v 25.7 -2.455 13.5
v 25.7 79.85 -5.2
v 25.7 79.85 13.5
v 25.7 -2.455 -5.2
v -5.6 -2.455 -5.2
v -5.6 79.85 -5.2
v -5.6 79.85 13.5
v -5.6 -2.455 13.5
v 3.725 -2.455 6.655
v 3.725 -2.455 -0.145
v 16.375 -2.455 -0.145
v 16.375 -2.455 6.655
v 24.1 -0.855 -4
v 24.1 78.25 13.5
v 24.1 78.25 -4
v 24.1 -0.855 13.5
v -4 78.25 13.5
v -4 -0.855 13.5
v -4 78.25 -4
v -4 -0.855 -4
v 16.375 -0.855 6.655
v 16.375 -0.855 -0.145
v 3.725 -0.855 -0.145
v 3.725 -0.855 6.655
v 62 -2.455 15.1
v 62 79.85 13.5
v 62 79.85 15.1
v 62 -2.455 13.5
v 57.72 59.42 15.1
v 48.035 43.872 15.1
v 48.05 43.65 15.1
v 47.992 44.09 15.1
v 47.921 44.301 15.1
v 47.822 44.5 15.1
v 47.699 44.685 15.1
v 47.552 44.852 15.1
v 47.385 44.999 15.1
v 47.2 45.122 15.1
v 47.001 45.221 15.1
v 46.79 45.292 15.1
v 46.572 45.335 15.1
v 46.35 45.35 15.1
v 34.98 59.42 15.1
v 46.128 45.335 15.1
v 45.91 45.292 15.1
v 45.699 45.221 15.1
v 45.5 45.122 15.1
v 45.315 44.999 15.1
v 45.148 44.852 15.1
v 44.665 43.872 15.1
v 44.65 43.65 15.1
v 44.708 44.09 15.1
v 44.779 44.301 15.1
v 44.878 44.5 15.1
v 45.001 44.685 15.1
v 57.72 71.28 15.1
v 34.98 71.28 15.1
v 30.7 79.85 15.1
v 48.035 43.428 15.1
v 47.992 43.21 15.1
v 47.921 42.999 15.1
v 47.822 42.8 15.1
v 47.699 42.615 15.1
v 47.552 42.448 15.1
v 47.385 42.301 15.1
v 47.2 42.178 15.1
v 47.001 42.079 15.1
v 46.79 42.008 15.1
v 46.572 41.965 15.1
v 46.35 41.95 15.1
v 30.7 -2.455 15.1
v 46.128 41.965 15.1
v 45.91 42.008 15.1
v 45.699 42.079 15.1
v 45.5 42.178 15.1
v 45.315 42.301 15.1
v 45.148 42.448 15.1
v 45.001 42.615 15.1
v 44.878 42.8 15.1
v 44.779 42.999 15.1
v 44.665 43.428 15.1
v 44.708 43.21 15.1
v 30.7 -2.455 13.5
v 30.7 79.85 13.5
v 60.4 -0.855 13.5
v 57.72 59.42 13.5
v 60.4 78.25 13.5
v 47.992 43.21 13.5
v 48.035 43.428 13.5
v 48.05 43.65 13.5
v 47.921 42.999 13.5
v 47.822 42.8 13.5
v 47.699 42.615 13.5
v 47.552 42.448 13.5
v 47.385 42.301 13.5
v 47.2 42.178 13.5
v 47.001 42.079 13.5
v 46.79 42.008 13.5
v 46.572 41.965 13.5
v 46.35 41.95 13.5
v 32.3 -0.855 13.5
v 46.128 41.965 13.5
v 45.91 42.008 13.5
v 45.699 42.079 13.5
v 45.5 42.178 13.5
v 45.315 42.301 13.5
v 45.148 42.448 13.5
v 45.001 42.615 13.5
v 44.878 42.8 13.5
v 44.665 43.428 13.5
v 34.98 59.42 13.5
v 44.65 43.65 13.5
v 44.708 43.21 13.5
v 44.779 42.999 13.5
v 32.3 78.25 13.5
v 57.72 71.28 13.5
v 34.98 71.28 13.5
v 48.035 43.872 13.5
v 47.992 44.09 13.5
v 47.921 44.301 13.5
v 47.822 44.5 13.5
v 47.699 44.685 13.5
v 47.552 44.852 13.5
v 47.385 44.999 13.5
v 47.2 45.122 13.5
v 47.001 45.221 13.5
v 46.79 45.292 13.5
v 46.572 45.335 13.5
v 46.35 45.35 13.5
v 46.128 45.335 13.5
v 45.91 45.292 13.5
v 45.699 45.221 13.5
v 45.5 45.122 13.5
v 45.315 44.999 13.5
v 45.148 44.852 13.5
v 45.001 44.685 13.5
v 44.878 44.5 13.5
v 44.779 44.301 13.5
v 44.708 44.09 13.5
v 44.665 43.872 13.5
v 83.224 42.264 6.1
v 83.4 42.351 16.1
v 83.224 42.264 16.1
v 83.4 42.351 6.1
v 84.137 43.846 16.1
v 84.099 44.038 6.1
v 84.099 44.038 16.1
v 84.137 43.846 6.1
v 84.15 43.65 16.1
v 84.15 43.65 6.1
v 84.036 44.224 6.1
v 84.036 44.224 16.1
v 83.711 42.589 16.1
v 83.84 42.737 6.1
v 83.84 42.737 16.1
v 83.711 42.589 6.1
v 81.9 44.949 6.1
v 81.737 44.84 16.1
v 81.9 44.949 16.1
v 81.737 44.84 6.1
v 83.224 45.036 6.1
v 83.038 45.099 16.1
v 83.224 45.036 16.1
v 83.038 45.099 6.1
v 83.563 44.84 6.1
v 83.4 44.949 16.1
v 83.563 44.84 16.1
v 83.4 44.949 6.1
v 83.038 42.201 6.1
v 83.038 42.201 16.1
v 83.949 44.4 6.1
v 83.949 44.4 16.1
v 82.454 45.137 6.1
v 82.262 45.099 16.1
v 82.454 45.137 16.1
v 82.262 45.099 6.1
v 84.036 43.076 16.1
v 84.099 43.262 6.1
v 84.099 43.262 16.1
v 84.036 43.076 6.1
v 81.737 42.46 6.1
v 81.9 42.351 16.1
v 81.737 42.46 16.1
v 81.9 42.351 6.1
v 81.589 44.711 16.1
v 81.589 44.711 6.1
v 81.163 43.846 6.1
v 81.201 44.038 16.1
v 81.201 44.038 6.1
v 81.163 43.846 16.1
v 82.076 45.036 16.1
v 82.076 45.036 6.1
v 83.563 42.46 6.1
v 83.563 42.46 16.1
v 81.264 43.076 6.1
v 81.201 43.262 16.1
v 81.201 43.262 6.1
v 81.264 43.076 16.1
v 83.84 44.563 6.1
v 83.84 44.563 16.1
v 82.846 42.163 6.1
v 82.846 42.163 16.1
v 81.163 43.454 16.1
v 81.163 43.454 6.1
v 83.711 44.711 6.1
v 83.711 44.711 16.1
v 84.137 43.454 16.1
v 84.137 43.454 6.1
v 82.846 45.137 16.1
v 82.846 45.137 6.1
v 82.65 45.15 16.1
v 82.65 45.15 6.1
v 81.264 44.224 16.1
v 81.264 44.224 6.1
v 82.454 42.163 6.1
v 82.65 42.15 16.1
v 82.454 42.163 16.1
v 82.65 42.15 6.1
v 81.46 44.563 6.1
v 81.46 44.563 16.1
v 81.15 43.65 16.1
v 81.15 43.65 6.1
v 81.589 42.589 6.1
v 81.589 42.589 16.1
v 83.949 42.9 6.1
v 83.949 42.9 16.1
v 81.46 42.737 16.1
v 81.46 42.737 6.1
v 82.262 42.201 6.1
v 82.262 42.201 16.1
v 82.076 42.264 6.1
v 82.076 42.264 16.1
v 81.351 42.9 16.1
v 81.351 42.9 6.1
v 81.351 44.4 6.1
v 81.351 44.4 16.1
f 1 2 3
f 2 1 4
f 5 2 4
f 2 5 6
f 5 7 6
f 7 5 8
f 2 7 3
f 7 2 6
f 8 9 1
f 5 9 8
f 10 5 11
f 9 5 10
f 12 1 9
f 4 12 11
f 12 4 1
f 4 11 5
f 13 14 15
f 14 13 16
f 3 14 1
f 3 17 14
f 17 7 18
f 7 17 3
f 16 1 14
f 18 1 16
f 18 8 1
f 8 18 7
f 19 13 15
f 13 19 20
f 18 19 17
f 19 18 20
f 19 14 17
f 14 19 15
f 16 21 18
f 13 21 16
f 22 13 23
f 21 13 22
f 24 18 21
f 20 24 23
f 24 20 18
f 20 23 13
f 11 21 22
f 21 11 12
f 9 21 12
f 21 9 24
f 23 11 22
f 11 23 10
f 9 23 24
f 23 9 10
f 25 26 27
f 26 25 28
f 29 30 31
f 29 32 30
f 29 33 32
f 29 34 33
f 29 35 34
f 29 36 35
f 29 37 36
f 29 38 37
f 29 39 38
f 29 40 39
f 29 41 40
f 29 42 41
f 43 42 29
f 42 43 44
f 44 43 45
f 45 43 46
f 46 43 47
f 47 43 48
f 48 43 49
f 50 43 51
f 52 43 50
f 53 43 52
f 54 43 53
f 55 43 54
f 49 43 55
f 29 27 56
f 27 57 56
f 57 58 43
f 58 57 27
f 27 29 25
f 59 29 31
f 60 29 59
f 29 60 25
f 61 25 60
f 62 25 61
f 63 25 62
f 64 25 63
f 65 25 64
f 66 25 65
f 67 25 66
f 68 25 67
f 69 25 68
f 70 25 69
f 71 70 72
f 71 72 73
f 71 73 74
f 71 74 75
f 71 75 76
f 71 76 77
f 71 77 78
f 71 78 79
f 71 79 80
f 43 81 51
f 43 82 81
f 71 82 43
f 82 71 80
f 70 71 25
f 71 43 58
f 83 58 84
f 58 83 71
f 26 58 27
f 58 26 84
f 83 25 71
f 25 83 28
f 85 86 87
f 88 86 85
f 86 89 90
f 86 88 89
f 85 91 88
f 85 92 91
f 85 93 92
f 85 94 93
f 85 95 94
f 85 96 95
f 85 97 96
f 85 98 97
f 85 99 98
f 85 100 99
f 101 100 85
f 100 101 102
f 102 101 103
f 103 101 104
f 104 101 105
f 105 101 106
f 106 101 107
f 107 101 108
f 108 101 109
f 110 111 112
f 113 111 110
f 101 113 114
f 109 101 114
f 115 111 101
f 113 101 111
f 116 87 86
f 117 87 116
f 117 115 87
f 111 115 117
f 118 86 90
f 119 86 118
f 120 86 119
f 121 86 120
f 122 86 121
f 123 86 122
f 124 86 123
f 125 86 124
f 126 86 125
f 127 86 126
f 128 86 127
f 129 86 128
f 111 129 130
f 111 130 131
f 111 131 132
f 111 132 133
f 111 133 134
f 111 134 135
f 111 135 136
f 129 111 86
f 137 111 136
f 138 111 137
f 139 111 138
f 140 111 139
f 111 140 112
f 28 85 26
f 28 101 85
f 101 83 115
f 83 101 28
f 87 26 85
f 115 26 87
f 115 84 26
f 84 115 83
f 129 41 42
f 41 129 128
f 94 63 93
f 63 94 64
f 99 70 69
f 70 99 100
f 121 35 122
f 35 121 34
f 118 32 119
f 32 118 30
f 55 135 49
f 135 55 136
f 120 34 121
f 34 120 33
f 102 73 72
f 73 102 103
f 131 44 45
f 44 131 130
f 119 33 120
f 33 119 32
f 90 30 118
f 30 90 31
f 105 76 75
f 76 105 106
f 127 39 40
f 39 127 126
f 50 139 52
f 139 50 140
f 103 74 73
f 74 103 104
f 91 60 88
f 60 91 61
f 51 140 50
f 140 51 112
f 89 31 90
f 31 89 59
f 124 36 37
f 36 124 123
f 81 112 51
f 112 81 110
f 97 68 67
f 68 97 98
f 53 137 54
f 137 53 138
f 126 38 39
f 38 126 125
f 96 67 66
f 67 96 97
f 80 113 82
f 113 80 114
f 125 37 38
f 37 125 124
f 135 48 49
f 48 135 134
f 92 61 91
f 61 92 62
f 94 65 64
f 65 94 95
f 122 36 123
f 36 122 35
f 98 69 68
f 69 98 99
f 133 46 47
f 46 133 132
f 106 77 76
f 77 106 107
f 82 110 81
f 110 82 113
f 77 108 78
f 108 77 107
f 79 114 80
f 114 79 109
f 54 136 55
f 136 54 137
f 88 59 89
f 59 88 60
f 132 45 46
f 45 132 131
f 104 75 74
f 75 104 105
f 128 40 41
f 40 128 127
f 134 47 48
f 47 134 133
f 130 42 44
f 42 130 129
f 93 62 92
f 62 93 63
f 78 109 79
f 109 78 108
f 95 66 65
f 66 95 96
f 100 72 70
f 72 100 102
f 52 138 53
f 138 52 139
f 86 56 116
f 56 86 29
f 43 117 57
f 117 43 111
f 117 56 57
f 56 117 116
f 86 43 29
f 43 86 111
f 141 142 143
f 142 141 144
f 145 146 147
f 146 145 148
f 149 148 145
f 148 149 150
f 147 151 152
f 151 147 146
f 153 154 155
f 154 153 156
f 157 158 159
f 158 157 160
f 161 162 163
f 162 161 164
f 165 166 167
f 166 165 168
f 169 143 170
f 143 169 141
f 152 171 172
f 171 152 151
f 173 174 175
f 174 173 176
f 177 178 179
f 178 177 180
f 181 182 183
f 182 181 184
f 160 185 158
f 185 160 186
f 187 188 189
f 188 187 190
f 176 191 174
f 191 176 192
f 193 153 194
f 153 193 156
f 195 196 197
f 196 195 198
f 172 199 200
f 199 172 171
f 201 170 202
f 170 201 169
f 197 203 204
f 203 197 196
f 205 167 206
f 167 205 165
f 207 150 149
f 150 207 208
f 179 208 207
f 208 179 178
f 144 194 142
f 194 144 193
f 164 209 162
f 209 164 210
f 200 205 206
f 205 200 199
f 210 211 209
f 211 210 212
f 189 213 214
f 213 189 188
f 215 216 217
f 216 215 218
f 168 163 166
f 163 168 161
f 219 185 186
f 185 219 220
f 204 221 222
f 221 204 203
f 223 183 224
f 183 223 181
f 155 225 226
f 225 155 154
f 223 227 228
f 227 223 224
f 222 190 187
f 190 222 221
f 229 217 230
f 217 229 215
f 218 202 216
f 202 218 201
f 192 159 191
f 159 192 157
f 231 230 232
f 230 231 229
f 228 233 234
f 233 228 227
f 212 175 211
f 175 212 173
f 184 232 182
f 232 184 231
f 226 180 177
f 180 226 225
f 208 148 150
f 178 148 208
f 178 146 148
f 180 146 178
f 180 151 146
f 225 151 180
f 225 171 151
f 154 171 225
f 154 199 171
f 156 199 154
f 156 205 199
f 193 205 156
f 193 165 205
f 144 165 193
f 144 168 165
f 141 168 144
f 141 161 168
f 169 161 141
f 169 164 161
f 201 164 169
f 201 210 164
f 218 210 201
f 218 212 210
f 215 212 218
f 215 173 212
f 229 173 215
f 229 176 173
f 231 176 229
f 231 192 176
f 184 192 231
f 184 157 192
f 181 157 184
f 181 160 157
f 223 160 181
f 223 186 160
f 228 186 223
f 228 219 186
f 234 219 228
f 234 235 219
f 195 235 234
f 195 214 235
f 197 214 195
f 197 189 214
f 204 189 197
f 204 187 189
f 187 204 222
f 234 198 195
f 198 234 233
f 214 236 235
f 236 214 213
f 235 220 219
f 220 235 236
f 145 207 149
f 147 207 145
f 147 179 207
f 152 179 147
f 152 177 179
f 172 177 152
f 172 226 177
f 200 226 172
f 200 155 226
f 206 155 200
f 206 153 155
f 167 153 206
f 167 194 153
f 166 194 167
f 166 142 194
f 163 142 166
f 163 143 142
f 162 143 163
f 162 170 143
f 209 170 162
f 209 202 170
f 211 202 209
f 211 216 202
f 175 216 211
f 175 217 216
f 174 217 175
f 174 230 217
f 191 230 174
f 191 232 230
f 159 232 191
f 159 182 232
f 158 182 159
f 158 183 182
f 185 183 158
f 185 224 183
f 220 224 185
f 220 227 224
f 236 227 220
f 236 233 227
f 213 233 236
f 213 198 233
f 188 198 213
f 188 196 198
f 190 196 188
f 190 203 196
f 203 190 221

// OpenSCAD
// MAS key enclosure, generated by device/hardware/enclosure.py. DESIGN-ONLY: never printed or fitted. NO FABRICAR sin revisión humana.
// Frame: x across, y along (USB-C at y = 0), z up from the board's bottom face. mm.
$fn = 48;
module shell() {
  difference() {
    translate([-5.600, -2.455, -5.200]) cube([31.300, 82.305, 20.300]);
    translate([-4.000, -0.855, -4.000]) cube([28.100, 79.105, 17.500]);
    translate([3.725, -3.455, -0.145]) cube([12.650, 3.600, 6.800]);
    translate([10.050, 43.650, 12.500]) cylinder(d = 3.400, h = 3.600);
    translate([-1.320, 59.420, 12.500]) cube([22.740, 11.860, 3.600]);
  }
}
module base() { intersection() { shell(); translate([-6.600, -3.455, -6.200]) cube([33.300, 84.305, 19.700]); } }
module lid() { intersection() { shell(); translate([-6.600, -3.455, 13.500]) cube([33.300, 84.305, 2.600]); } }
module plunger() { translate([10.050, 43.650, 6.100]) cylinder(d = 3.000, h = 10.000); }
base();
translate([36.300, 0, 0]) lid();
translate([72.600, 0, 0]) plunger();
